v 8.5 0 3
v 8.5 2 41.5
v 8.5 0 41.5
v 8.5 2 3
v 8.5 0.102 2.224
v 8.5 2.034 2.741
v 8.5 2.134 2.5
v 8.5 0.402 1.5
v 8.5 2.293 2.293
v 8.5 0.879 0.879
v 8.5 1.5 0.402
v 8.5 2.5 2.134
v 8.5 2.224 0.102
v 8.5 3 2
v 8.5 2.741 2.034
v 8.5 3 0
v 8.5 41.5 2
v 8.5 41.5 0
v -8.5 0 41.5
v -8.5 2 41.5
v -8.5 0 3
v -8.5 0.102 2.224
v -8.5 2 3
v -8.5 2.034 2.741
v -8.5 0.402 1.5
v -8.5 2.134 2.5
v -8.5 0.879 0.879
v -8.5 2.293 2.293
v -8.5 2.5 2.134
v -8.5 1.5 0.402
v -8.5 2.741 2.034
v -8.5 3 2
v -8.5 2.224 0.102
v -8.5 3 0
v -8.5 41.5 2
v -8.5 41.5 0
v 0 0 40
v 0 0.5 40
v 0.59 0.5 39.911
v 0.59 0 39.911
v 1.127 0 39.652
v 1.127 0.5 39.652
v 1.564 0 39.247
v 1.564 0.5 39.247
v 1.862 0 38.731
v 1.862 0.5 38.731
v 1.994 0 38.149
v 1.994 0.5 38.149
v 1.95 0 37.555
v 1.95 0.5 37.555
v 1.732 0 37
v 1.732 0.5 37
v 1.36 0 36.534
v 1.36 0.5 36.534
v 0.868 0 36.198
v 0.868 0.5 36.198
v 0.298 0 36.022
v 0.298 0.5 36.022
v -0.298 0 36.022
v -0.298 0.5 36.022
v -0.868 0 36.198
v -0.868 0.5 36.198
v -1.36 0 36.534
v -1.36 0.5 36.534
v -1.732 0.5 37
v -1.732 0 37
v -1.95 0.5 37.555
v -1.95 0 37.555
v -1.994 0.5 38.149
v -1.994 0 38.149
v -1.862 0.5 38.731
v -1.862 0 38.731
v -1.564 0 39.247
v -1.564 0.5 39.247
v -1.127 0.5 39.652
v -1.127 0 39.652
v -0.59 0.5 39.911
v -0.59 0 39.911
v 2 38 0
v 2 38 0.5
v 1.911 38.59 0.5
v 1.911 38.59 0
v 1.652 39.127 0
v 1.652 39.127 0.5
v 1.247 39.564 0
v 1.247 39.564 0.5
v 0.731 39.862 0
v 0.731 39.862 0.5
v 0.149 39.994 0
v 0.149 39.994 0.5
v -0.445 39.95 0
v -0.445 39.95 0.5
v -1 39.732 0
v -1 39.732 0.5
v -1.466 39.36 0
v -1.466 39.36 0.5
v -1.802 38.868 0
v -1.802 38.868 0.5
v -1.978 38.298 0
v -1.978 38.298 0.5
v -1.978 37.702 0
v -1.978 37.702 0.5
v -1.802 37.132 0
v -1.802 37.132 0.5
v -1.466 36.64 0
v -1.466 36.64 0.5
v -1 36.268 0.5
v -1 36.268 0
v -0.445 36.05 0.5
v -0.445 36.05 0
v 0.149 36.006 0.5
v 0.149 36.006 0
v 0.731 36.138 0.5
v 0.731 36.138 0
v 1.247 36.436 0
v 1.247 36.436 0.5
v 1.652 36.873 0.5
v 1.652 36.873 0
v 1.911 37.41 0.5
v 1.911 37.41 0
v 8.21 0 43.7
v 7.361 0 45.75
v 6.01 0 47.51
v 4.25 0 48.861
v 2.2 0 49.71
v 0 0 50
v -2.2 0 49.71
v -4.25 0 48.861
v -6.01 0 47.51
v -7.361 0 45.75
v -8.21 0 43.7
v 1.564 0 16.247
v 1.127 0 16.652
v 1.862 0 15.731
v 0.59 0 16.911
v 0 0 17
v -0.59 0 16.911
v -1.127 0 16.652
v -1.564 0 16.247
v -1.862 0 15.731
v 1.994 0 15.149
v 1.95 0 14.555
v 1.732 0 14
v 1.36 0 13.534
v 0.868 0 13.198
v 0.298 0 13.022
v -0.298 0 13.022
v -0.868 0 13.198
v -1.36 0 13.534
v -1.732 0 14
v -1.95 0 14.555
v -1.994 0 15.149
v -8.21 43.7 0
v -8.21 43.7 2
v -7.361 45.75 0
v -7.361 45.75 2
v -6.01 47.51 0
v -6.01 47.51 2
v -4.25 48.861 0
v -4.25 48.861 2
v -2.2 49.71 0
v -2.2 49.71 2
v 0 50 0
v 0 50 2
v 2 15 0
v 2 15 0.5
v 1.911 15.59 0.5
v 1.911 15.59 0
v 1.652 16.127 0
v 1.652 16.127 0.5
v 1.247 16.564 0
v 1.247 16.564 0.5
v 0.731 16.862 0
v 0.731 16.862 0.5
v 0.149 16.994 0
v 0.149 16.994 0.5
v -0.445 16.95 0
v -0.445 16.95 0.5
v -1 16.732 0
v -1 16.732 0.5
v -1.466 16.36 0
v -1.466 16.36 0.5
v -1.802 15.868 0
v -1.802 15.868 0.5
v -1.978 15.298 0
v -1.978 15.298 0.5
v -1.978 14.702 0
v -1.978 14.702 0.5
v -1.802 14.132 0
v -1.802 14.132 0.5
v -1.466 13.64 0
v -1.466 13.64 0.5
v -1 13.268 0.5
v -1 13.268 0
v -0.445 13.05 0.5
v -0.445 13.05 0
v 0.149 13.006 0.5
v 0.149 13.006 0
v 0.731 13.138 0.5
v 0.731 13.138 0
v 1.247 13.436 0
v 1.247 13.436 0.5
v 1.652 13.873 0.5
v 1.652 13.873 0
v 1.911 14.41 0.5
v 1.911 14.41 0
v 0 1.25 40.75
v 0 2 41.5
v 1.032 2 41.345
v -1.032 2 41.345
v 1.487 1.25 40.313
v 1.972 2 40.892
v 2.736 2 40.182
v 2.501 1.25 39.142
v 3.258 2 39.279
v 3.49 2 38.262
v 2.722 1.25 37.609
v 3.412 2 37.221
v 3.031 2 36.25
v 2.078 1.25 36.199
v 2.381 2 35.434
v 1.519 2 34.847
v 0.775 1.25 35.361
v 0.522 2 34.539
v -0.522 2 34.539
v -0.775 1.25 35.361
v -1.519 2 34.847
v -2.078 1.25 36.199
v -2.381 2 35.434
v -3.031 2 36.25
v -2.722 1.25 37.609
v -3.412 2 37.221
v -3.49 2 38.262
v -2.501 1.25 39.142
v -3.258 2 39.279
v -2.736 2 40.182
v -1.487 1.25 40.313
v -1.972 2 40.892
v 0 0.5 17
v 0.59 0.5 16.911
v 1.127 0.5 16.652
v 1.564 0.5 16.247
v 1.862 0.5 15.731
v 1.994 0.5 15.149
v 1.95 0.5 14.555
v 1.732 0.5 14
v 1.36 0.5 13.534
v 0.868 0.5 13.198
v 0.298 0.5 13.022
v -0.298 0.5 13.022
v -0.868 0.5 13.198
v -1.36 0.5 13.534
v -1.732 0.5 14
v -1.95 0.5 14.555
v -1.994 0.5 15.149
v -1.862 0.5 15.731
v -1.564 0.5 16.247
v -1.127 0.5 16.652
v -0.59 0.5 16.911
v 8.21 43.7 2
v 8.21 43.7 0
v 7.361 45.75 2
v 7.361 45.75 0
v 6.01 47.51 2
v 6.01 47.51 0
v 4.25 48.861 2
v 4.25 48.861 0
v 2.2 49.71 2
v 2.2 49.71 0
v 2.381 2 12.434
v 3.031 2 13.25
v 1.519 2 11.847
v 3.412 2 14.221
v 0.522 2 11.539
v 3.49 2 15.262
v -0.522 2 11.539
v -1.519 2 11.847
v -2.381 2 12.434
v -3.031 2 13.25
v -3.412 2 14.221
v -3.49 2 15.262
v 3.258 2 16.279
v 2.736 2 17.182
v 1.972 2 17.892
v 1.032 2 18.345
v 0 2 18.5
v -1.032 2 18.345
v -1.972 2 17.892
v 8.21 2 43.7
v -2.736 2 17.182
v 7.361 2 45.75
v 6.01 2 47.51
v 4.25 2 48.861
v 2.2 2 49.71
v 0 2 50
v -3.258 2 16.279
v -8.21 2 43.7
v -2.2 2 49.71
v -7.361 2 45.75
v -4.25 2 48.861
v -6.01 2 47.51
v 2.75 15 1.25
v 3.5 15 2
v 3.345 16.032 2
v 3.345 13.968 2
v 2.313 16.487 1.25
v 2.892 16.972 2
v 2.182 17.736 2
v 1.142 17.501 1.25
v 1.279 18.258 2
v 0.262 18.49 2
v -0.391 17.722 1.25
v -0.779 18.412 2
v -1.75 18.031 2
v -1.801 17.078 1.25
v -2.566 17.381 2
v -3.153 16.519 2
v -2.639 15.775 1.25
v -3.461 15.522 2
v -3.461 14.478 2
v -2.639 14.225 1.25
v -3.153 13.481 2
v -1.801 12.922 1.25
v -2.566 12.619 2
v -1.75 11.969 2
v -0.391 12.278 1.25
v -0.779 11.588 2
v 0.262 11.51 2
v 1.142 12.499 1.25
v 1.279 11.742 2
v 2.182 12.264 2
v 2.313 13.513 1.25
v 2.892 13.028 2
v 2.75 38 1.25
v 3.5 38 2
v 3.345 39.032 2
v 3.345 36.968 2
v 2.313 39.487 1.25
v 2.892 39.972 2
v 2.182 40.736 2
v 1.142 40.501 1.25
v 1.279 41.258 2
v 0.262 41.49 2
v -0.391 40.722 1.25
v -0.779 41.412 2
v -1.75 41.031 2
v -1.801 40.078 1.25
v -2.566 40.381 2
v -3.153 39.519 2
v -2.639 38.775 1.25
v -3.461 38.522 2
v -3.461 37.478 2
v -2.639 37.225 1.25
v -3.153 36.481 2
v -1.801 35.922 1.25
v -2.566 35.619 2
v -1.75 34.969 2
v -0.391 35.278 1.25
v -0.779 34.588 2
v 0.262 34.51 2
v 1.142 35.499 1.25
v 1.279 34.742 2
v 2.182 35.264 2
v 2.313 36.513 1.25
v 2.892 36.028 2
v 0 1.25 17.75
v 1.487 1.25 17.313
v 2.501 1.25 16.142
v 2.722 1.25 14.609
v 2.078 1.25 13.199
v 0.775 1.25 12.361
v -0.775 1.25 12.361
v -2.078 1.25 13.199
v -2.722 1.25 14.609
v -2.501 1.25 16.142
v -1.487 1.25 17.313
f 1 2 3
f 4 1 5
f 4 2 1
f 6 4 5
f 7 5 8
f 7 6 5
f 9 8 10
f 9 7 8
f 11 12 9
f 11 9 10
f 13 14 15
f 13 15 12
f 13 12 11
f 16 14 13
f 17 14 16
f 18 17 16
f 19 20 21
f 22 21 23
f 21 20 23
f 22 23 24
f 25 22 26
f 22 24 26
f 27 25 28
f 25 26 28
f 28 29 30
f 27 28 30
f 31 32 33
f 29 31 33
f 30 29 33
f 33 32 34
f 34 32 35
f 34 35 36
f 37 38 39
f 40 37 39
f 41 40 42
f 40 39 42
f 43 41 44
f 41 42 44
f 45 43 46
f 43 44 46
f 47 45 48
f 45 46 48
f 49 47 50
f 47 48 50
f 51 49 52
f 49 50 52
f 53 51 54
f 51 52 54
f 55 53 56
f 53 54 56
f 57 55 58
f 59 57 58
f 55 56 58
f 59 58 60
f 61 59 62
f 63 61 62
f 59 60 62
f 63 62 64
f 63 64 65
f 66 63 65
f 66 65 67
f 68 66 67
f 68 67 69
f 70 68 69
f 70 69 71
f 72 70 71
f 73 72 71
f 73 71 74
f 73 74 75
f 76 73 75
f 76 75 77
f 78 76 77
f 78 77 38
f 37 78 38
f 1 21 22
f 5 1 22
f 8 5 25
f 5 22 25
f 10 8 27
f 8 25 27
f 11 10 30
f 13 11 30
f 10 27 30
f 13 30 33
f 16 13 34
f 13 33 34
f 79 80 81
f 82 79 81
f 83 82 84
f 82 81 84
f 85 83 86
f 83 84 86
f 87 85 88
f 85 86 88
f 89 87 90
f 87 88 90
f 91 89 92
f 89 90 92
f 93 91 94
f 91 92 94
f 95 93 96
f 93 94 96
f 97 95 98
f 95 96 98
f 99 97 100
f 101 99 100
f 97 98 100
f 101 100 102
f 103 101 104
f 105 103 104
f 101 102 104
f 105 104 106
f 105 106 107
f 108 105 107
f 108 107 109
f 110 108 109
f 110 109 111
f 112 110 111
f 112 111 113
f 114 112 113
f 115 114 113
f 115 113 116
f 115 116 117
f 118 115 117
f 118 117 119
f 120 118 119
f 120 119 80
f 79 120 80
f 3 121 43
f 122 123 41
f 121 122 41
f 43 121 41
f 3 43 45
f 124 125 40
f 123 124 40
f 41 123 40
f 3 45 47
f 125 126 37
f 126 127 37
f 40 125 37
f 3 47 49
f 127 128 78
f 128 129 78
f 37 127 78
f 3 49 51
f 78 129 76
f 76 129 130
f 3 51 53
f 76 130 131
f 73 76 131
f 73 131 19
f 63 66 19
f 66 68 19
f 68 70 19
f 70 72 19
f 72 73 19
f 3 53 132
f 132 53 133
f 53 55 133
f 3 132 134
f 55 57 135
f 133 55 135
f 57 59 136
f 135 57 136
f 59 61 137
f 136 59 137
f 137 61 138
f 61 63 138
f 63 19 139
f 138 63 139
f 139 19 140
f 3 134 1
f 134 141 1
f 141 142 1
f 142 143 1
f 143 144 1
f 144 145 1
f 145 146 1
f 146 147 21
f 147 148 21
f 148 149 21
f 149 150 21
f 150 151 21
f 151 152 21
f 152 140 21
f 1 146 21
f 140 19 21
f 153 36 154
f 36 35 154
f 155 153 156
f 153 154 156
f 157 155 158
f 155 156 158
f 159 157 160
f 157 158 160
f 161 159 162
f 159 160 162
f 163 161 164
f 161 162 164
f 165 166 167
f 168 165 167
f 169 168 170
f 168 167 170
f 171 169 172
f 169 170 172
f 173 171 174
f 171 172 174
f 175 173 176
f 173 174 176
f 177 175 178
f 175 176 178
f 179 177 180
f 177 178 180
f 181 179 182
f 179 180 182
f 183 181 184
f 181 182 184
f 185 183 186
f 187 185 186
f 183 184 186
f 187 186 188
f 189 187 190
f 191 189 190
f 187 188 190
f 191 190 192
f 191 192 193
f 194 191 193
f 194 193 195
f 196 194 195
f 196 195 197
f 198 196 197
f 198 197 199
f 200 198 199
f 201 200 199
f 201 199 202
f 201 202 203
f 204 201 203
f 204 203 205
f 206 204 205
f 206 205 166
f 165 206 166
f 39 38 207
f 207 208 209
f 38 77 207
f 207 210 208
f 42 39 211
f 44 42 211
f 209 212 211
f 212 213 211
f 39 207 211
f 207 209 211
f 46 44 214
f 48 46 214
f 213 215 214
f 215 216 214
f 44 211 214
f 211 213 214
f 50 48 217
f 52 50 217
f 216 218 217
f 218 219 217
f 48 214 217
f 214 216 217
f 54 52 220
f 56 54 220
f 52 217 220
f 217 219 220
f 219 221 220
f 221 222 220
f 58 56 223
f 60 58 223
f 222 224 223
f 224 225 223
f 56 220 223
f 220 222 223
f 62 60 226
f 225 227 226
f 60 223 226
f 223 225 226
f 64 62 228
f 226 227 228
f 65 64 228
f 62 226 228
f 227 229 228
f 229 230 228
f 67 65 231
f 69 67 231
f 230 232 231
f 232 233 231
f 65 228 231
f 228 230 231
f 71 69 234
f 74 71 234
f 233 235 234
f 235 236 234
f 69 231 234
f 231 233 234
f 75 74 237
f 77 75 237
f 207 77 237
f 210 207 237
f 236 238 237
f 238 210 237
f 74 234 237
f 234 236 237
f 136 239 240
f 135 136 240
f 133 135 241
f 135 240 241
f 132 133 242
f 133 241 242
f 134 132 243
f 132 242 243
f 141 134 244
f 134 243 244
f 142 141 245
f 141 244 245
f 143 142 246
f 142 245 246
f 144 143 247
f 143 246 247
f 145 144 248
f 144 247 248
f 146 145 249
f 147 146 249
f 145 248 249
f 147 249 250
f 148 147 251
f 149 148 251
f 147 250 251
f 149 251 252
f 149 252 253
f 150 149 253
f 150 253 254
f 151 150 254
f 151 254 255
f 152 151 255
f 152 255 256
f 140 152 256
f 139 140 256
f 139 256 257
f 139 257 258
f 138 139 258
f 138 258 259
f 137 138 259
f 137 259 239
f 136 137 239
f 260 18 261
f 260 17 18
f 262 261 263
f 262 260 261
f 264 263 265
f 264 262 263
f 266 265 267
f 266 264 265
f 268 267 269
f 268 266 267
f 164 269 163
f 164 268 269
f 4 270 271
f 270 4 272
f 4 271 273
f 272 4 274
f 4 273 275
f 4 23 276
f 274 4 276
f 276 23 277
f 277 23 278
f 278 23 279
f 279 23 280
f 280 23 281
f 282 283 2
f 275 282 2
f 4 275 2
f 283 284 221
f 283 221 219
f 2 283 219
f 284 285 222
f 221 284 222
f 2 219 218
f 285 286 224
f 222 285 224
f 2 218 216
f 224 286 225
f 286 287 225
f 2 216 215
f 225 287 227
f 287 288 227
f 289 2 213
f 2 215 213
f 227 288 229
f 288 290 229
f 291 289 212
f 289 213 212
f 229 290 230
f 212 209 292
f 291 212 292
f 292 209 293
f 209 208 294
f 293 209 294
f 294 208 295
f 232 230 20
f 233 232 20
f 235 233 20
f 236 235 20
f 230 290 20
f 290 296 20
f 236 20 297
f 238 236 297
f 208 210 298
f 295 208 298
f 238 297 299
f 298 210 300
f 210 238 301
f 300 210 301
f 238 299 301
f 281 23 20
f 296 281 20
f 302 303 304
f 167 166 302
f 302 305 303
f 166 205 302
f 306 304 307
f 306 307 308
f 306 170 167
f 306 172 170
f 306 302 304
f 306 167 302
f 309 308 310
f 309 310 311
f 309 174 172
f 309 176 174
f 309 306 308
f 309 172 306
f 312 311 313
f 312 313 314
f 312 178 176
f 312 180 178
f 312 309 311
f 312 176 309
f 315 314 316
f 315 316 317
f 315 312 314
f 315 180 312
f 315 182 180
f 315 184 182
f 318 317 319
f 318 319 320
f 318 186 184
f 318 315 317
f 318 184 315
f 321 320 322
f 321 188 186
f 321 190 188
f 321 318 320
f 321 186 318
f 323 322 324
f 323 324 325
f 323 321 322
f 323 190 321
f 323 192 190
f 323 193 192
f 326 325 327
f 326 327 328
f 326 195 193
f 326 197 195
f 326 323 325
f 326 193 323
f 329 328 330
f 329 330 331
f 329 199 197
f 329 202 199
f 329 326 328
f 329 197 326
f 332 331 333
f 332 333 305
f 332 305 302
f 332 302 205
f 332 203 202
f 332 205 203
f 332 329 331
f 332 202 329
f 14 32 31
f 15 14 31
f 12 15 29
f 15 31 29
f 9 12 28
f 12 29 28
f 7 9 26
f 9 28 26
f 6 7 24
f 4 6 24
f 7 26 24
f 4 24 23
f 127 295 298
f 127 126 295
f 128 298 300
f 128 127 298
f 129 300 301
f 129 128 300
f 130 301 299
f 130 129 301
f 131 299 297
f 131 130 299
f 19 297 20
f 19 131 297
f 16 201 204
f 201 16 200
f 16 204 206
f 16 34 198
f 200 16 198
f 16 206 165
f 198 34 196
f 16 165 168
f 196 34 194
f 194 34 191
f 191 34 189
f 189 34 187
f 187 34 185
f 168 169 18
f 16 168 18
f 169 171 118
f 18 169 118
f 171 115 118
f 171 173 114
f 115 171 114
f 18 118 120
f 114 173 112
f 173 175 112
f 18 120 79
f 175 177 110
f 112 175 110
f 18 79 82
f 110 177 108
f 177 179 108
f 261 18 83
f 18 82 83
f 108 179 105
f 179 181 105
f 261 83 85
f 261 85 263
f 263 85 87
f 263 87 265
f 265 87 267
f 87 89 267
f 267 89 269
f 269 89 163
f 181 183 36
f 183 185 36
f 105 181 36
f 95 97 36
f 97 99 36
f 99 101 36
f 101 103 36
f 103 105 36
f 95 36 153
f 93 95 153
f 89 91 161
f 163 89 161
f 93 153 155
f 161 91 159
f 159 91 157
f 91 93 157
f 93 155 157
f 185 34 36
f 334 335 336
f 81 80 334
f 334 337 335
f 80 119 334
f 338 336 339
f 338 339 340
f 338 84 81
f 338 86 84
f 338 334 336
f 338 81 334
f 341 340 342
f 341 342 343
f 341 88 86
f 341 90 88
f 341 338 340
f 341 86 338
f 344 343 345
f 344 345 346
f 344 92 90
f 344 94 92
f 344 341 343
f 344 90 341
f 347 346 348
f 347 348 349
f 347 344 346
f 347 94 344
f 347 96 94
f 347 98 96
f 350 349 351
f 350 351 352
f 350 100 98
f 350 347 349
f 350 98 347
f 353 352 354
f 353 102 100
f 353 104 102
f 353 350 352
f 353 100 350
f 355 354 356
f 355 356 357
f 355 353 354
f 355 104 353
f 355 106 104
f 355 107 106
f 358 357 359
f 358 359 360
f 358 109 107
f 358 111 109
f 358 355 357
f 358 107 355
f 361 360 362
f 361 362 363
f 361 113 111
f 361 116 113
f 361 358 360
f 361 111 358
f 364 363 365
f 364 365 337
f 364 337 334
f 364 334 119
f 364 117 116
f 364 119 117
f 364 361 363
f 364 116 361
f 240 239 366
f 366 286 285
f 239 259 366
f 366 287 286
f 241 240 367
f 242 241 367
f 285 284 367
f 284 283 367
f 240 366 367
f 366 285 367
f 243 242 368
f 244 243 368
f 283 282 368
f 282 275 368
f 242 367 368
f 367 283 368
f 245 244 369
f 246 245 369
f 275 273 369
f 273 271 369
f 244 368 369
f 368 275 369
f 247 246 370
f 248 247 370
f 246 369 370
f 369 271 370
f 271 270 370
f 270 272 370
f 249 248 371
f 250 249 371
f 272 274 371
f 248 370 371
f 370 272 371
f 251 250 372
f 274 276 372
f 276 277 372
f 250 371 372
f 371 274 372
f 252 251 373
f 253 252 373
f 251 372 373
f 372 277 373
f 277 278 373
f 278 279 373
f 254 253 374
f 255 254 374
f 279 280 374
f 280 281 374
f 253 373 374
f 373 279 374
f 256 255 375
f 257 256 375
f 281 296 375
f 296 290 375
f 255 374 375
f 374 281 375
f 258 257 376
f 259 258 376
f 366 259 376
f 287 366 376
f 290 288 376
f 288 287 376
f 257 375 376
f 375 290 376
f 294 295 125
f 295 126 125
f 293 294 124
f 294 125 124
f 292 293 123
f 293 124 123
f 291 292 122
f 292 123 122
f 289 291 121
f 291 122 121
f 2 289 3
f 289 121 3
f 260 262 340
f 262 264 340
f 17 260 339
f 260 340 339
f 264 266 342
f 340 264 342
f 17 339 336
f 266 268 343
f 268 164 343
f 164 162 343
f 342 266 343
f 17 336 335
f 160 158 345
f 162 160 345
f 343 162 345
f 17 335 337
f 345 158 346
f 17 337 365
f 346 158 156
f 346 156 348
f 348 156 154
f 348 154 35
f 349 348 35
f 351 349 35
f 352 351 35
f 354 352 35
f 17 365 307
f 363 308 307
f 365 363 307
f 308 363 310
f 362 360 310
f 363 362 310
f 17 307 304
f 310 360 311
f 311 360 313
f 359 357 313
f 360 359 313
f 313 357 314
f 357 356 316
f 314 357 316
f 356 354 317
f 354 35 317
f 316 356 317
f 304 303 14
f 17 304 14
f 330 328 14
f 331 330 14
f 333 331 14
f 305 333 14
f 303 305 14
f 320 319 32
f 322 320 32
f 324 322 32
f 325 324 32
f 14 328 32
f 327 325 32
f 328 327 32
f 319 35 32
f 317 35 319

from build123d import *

# Parameters (mm, degrees)
EXTRUDE_1_DEPTH      = 8.5
EXTRUDE_1_DEPTH_BACK = 8.5
SKETCH_3_R           = 2
CUT_EXTRUDE_2_DEPTH  = 15.5
SKETCH_4_R           = 2
CUT_EXTRUDE_3_DEPTH  = 15.5
FILLET_1_R           = 8.5
CHAMFER_1_SIZE       = 1.5


with BuildPart() as part:
    # 草图1 → 凸台-拉伸1 (new, two sides: drawn at the far end of the back side and taken through both)
    with BuildSketch(Plane(origin=(0, 0, 0), x_dir=(0, 0, -1), z_dir=(1, 0, 0)).offset(-EXTRUDE_1_DEPTH_BACK)):
        with BuildLine():
            Line((-50, 0), (-3, 0))
            ThreePointArc((-3, 0), (-0.878679656, 0.878679656), (0, 3))
            Line((0, 3), (0, 50))
            Line((0, 50), (-2, 50))
            Line((-2, 50), (-2, 3))
            ThreePointArc((-2, 3), (-2.292893219, 2.292893219), (-3, 2))
            Line((-3, 2), (-50, 2))
            Line((-50, 2), (-50, 0))
        make_face()
    extrude(amount=EXTRUDE_1_DEPTH + EXTRUDE_1_DEPTH_BACK)

    # 草图3 → 切除-拉伸2 (cut)
    with BuildSketch(Plane(origin=(0, 2, 0), x_dir=(1, 0, 0), z_dir=(0, 1, 0))):
        with Locations(Location((0, -38, 0), (0, 0, 270))):
            Circle(SKETCH_3_R)
        with Locations(Location((0, -15, 0), (0, 0, 270))):
            Circle(SKETCH_3_R)
    extrude(amount=-CUT_EXTRUDE_2_DEPTH, mode=Mode.SUBTRACT)

    # 草图4 → 切除-拉伸3 (cut)
    with BuildSketch(Plane.XY.offset(2)):
        with Locations((0, 38)):
            Circle(SKETCH_4_R)
        with Locations((0, 15)):
            Circle(SKETCH_4_R)
    extrude(amount=-CUT_EXTRUDE_3_DEPTH, mode=Mode.SUBTRACT)

    # 圆角1
    fillet_1_edges = [part.edges().sort_by_distance(p)[0] for p in [
        (8.5, 50, 1),
        (-8.5, 50, 1),
        (8.5, 1, 50),
        (-8.5, 1, 50),
    ]]
    fillet(fillet_1_edges, radius=FILLET_1_R - 0.0001)  # a hair under: the kernel refuses the full size

    # 倒角1
    chamfer_1_edges = [part.edges().sort_by_distance(p)[0] for p in [
        (0, 2, 36),
        (0, 2, 13),
        (-2, 38, 2),
        (-2, 15, 2),
    ]]
    chamfer(chamfer_1_edges, length=CHAMFER_1_SIZE)


solid = part.part
